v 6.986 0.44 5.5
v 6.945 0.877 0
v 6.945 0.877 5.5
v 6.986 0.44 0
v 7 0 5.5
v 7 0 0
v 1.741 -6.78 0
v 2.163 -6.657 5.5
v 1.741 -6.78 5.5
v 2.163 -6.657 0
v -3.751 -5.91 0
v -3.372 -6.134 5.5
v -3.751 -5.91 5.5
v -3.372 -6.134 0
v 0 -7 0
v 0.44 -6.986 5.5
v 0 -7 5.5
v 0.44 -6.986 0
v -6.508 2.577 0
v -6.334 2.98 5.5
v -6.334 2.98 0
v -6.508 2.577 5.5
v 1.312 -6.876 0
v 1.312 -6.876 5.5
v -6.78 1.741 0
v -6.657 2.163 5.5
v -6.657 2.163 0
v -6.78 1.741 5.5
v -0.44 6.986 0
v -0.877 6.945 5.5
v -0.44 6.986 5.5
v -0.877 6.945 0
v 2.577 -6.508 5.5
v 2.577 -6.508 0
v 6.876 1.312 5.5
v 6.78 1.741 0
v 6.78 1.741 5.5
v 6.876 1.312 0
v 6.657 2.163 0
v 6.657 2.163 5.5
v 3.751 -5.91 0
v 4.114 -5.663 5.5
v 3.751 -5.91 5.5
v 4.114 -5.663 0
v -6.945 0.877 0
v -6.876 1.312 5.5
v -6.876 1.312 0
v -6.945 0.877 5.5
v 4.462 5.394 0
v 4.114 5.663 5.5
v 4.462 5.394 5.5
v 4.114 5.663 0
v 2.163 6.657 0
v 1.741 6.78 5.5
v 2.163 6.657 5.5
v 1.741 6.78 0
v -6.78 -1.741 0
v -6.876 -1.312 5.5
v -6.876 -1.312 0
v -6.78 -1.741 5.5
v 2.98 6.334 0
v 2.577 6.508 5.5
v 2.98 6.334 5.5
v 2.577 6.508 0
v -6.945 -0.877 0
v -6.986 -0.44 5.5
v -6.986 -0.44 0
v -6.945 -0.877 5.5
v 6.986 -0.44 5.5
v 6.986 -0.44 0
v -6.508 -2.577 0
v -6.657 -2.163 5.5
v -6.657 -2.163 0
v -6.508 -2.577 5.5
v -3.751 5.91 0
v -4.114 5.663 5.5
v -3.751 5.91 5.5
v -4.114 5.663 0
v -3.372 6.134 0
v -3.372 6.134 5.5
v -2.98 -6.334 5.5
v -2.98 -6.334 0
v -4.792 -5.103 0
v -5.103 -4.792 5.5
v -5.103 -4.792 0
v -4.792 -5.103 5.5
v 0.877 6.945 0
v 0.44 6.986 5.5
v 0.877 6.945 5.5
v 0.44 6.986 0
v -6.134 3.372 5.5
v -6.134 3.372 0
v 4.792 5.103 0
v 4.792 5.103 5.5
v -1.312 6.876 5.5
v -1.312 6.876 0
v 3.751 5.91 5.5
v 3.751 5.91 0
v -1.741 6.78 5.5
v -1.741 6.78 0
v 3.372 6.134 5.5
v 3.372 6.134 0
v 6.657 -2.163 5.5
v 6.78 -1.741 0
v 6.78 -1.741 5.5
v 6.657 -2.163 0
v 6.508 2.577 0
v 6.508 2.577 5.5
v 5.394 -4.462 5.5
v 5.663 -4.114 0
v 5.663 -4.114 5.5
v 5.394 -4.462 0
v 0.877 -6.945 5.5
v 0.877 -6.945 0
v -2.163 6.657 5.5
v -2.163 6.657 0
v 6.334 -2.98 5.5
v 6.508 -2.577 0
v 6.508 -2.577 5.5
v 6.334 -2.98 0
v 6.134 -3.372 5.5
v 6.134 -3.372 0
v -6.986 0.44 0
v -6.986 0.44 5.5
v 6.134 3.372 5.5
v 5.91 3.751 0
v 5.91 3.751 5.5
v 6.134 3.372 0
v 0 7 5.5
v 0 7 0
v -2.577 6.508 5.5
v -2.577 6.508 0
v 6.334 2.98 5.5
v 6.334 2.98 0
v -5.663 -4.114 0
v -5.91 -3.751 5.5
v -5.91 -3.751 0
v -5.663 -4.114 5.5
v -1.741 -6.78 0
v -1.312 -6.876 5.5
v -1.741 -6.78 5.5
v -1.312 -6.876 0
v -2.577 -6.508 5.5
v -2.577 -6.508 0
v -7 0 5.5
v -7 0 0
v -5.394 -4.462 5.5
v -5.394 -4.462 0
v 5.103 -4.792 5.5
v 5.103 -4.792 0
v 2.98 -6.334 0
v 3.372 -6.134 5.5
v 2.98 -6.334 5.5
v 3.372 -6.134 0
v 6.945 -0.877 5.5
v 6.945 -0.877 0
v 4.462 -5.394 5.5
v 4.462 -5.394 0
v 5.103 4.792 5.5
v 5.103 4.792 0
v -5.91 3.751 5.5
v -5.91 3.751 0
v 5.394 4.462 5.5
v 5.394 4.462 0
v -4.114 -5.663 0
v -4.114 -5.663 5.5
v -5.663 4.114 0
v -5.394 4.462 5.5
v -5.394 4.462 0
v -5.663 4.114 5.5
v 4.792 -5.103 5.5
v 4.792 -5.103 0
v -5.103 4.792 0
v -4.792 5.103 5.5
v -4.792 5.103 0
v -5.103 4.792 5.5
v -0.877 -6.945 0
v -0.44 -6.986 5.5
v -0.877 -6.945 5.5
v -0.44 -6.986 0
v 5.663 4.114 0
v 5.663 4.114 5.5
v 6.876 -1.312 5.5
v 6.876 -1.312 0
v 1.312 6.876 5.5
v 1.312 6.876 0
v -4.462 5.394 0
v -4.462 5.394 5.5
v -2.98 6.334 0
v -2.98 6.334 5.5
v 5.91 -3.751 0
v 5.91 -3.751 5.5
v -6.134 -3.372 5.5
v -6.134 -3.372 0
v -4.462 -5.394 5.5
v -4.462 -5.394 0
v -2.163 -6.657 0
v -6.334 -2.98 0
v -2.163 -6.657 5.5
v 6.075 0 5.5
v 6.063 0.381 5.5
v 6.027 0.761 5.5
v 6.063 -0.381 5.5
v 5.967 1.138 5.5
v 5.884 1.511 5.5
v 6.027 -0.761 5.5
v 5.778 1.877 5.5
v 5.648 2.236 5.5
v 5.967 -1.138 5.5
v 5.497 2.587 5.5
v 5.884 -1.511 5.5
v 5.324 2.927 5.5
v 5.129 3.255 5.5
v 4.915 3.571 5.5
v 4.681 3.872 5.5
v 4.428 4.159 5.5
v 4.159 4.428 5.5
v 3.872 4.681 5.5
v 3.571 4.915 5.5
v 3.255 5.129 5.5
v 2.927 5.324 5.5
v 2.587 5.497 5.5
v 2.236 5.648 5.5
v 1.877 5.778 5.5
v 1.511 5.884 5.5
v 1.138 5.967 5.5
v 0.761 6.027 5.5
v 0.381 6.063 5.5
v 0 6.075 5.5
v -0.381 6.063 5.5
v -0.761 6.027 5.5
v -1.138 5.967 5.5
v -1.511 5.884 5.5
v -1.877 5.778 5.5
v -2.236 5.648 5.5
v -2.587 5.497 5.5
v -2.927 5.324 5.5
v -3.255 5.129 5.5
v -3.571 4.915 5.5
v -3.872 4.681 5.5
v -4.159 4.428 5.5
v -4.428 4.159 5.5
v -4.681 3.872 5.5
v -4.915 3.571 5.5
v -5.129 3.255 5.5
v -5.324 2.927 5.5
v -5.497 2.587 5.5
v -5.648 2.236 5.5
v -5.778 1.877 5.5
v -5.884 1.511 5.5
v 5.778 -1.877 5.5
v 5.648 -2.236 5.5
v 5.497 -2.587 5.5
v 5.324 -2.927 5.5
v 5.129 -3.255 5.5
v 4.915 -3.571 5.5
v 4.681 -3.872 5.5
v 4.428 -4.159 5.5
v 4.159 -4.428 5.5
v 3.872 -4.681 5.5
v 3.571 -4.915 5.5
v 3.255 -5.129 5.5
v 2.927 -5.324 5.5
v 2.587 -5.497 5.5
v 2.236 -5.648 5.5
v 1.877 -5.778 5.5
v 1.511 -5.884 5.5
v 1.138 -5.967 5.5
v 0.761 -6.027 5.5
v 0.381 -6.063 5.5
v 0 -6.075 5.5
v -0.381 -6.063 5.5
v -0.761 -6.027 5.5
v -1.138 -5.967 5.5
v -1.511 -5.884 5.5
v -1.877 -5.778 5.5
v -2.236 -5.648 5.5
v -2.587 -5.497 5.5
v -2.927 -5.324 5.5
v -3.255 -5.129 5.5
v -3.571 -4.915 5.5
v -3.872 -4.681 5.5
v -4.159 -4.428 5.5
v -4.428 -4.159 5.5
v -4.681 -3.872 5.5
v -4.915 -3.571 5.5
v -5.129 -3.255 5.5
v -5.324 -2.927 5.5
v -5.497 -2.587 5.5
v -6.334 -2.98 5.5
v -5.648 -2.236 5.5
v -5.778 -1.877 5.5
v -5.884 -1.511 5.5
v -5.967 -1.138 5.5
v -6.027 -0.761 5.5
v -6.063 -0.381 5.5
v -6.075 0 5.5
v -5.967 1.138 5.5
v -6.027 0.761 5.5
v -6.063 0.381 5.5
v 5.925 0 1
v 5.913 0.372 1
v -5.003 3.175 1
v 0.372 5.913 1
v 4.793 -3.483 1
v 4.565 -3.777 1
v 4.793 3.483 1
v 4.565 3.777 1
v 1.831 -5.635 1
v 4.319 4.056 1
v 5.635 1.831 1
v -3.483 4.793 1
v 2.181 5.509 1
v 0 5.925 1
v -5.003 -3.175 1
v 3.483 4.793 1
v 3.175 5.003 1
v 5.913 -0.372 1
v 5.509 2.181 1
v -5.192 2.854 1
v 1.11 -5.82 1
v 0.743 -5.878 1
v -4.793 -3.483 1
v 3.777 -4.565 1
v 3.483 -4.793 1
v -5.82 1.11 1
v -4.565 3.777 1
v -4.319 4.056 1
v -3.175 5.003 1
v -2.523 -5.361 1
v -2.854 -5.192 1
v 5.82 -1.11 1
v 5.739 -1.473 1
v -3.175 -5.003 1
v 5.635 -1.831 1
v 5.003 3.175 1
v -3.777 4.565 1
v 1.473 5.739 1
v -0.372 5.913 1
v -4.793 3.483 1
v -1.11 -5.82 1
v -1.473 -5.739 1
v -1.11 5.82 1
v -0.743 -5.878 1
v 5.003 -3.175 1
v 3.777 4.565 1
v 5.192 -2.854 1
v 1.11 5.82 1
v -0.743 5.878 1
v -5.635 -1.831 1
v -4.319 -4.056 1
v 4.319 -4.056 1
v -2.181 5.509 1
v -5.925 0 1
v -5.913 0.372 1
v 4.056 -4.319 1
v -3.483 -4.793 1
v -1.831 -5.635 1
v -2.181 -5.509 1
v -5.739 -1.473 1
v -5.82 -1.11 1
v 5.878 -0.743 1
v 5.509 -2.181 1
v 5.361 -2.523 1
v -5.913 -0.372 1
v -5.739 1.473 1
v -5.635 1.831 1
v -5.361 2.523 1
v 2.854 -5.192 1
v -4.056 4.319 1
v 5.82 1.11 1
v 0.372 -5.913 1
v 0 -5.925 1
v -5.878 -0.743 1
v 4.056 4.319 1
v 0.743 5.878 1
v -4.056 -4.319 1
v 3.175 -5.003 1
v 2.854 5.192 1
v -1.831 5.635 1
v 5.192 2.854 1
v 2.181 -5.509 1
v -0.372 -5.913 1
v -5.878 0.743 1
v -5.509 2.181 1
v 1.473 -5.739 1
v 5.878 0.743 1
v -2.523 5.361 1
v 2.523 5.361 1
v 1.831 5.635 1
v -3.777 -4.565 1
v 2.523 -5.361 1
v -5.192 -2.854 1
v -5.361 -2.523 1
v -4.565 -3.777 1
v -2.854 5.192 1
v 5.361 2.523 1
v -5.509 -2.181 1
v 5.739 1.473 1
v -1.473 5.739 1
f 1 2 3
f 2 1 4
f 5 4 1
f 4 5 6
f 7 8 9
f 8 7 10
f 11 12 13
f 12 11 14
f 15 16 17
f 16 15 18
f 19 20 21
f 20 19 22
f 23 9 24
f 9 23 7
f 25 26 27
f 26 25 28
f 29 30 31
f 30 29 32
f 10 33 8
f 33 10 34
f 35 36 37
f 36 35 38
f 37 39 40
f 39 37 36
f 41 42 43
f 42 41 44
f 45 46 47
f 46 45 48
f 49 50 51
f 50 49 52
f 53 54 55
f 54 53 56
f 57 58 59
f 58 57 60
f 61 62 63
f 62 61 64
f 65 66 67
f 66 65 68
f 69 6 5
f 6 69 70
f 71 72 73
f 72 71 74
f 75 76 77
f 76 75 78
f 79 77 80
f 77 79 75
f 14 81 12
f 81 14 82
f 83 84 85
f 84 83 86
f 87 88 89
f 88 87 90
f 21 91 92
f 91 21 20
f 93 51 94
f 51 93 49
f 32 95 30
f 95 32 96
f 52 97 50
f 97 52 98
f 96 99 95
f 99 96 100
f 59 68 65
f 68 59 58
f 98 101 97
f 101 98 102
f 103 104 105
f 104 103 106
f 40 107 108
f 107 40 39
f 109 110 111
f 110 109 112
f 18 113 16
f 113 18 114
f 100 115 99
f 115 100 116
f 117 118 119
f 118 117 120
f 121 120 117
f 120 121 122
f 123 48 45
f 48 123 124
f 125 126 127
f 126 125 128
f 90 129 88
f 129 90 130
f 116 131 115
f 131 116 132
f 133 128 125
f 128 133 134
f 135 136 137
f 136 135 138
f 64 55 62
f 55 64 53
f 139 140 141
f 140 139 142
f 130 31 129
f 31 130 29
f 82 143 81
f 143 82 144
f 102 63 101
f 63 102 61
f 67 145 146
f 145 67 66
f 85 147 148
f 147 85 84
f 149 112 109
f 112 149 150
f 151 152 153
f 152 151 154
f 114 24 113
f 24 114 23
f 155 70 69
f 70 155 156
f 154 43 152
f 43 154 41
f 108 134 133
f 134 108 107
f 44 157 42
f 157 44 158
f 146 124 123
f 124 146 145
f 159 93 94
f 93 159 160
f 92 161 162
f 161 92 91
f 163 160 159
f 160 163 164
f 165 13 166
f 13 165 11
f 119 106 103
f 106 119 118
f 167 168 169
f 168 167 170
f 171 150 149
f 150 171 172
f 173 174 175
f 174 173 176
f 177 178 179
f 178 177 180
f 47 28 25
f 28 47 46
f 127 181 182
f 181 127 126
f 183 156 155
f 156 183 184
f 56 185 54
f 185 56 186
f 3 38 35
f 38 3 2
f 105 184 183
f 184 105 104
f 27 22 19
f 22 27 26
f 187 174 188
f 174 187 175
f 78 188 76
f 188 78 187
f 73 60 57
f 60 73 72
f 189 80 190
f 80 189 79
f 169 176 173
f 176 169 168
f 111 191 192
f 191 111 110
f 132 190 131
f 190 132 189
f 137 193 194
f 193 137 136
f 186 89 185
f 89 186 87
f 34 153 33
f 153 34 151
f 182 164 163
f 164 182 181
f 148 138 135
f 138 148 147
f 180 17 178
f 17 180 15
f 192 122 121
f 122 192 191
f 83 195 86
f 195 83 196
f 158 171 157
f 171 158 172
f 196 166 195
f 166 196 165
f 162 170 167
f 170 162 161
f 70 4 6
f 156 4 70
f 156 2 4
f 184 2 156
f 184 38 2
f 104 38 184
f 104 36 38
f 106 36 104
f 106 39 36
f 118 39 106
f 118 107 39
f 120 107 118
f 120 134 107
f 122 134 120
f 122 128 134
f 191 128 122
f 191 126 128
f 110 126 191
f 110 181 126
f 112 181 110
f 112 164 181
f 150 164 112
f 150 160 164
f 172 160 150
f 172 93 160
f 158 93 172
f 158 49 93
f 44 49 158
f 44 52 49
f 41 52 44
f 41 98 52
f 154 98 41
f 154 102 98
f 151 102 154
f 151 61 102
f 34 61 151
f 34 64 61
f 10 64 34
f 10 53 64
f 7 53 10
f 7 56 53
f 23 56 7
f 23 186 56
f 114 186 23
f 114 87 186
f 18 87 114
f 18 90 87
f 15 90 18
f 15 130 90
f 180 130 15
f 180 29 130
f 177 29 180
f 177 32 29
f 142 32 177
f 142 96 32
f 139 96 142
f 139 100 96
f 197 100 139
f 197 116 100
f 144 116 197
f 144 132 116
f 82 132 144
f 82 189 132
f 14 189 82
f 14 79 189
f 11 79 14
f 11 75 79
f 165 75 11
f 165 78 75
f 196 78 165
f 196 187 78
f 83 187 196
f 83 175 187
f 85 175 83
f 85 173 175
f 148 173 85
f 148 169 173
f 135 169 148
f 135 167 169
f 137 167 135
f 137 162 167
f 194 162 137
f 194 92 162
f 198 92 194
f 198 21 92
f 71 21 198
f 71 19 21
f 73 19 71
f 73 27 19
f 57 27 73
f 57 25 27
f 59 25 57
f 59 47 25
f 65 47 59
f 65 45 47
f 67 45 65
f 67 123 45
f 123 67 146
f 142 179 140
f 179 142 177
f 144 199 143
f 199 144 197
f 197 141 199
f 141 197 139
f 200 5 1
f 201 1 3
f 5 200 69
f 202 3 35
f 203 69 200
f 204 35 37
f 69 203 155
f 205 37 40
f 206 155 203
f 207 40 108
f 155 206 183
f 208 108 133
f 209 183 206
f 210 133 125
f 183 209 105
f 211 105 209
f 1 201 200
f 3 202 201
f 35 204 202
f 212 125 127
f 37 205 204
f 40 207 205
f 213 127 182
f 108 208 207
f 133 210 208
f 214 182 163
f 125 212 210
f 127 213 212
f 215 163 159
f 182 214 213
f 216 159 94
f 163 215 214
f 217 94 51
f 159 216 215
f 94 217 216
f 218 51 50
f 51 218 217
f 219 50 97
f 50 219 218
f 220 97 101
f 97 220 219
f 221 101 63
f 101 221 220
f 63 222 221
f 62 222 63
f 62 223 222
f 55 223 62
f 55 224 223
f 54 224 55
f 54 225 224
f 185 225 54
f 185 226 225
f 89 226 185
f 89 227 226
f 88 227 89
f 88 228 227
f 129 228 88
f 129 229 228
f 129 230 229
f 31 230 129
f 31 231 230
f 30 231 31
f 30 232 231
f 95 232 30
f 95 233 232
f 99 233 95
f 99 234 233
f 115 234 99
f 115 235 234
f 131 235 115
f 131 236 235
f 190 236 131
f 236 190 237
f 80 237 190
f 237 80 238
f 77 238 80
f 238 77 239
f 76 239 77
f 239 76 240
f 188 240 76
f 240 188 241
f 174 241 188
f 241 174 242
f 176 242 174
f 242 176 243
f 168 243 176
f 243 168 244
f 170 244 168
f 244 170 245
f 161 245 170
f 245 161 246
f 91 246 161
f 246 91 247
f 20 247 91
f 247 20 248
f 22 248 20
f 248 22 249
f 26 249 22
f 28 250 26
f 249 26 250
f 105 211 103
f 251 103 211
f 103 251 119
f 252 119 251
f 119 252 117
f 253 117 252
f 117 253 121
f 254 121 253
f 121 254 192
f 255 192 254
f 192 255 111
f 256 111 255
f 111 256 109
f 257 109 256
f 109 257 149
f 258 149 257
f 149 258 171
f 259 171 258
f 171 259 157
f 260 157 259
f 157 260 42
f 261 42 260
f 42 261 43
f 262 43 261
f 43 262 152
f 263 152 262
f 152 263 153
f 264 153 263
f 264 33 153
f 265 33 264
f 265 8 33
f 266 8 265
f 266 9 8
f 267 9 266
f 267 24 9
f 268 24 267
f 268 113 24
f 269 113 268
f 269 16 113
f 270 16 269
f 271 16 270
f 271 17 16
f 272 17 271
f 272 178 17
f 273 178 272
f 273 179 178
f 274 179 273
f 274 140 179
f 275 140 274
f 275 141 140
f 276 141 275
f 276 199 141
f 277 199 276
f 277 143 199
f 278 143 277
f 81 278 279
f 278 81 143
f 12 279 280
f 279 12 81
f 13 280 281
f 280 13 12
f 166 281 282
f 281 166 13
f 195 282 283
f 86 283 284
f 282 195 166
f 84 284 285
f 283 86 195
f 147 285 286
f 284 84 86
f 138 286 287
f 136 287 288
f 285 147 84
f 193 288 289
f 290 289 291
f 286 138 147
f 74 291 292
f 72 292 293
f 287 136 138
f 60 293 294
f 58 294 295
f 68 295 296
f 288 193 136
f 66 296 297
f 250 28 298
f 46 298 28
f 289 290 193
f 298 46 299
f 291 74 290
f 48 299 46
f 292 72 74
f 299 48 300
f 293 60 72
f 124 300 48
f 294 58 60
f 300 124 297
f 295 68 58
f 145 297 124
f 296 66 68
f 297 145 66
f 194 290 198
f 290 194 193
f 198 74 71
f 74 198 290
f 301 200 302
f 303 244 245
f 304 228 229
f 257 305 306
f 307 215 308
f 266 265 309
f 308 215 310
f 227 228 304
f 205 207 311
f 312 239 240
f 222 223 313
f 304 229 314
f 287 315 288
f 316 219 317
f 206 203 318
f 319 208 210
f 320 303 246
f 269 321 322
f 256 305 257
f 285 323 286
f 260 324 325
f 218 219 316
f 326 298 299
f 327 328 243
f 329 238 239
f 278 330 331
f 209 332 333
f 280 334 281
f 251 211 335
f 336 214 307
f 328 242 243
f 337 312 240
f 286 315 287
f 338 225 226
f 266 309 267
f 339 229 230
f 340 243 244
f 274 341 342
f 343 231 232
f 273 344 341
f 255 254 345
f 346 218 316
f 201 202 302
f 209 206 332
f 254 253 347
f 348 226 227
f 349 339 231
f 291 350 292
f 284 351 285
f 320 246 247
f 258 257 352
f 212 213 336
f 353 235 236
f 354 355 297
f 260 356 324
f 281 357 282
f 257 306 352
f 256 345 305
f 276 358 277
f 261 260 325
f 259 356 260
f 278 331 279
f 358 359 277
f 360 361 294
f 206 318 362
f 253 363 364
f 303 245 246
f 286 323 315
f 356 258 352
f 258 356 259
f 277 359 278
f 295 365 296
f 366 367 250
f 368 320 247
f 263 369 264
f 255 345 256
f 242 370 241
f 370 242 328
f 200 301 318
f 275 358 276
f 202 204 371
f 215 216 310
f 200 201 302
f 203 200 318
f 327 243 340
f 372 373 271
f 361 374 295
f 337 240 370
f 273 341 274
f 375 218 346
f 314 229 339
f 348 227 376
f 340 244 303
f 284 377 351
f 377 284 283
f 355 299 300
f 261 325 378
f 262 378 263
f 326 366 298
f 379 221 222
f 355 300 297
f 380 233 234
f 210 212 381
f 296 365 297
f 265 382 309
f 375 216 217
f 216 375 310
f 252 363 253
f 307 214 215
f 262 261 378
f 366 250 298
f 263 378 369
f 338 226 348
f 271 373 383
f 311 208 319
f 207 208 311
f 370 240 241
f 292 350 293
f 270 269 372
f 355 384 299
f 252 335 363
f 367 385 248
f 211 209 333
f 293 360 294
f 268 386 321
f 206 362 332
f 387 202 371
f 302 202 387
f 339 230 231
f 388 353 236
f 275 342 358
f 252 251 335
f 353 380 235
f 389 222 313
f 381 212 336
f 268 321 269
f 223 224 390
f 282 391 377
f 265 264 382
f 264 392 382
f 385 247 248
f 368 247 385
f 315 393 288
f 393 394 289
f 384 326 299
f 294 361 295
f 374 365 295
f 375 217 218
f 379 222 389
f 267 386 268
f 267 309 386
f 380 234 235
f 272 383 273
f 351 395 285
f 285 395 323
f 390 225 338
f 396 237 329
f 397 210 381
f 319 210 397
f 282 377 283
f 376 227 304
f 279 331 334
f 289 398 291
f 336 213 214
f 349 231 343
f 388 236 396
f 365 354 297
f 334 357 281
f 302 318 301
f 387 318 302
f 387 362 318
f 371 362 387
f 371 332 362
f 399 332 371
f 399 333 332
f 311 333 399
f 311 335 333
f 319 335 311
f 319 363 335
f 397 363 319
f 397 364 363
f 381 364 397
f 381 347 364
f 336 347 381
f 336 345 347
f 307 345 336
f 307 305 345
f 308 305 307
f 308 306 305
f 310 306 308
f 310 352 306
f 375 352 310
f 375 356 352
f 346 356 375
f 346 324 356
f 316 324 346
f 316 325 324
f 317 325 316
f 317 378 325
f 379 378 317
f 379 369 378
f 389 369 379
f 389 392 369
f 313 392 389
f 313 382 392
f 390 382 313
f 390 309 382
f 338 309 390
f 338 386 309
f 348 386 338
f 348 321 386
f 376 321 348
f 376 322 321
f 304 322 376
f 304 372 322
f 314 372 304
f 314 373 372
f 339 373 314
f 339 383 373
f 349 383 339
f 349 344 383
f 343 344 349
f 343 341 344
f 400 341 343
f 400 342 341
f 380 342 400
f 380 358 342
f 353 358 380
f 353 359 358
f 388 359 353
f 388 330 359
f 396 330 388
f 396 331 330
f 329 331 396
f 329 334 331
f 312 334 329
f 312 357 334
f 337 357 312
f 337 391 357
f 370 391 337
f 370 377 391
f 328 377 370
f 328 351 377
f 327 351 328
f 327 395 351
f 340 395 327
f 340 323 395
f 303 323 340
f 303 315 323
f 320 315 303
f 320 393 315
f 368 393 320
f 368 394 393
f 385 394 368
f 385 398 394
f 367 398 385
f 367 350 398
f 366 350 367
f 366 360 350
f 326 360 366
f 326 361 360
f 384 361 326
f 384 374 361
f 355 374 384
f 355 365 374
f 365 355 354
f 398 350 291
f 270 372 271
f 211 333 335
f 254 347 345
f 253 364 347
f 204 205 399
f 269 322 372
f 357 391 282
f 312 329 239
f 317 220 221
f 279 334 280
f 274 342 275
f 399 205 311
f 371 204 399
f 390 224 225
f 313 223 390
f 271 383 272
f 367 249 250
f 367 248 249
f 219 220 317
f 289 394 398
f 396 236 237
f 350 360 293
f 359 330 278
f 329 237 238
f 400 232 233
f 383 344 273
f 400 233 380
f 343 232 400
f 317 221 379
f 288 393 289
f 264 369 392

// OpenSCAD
$fn = 100;

difference() {
    cylinder(h=5.5, d=14);
    translate([0, 0, 1])
        cylinder(h=4.5, r1=5.925, r2=6.075);
}
